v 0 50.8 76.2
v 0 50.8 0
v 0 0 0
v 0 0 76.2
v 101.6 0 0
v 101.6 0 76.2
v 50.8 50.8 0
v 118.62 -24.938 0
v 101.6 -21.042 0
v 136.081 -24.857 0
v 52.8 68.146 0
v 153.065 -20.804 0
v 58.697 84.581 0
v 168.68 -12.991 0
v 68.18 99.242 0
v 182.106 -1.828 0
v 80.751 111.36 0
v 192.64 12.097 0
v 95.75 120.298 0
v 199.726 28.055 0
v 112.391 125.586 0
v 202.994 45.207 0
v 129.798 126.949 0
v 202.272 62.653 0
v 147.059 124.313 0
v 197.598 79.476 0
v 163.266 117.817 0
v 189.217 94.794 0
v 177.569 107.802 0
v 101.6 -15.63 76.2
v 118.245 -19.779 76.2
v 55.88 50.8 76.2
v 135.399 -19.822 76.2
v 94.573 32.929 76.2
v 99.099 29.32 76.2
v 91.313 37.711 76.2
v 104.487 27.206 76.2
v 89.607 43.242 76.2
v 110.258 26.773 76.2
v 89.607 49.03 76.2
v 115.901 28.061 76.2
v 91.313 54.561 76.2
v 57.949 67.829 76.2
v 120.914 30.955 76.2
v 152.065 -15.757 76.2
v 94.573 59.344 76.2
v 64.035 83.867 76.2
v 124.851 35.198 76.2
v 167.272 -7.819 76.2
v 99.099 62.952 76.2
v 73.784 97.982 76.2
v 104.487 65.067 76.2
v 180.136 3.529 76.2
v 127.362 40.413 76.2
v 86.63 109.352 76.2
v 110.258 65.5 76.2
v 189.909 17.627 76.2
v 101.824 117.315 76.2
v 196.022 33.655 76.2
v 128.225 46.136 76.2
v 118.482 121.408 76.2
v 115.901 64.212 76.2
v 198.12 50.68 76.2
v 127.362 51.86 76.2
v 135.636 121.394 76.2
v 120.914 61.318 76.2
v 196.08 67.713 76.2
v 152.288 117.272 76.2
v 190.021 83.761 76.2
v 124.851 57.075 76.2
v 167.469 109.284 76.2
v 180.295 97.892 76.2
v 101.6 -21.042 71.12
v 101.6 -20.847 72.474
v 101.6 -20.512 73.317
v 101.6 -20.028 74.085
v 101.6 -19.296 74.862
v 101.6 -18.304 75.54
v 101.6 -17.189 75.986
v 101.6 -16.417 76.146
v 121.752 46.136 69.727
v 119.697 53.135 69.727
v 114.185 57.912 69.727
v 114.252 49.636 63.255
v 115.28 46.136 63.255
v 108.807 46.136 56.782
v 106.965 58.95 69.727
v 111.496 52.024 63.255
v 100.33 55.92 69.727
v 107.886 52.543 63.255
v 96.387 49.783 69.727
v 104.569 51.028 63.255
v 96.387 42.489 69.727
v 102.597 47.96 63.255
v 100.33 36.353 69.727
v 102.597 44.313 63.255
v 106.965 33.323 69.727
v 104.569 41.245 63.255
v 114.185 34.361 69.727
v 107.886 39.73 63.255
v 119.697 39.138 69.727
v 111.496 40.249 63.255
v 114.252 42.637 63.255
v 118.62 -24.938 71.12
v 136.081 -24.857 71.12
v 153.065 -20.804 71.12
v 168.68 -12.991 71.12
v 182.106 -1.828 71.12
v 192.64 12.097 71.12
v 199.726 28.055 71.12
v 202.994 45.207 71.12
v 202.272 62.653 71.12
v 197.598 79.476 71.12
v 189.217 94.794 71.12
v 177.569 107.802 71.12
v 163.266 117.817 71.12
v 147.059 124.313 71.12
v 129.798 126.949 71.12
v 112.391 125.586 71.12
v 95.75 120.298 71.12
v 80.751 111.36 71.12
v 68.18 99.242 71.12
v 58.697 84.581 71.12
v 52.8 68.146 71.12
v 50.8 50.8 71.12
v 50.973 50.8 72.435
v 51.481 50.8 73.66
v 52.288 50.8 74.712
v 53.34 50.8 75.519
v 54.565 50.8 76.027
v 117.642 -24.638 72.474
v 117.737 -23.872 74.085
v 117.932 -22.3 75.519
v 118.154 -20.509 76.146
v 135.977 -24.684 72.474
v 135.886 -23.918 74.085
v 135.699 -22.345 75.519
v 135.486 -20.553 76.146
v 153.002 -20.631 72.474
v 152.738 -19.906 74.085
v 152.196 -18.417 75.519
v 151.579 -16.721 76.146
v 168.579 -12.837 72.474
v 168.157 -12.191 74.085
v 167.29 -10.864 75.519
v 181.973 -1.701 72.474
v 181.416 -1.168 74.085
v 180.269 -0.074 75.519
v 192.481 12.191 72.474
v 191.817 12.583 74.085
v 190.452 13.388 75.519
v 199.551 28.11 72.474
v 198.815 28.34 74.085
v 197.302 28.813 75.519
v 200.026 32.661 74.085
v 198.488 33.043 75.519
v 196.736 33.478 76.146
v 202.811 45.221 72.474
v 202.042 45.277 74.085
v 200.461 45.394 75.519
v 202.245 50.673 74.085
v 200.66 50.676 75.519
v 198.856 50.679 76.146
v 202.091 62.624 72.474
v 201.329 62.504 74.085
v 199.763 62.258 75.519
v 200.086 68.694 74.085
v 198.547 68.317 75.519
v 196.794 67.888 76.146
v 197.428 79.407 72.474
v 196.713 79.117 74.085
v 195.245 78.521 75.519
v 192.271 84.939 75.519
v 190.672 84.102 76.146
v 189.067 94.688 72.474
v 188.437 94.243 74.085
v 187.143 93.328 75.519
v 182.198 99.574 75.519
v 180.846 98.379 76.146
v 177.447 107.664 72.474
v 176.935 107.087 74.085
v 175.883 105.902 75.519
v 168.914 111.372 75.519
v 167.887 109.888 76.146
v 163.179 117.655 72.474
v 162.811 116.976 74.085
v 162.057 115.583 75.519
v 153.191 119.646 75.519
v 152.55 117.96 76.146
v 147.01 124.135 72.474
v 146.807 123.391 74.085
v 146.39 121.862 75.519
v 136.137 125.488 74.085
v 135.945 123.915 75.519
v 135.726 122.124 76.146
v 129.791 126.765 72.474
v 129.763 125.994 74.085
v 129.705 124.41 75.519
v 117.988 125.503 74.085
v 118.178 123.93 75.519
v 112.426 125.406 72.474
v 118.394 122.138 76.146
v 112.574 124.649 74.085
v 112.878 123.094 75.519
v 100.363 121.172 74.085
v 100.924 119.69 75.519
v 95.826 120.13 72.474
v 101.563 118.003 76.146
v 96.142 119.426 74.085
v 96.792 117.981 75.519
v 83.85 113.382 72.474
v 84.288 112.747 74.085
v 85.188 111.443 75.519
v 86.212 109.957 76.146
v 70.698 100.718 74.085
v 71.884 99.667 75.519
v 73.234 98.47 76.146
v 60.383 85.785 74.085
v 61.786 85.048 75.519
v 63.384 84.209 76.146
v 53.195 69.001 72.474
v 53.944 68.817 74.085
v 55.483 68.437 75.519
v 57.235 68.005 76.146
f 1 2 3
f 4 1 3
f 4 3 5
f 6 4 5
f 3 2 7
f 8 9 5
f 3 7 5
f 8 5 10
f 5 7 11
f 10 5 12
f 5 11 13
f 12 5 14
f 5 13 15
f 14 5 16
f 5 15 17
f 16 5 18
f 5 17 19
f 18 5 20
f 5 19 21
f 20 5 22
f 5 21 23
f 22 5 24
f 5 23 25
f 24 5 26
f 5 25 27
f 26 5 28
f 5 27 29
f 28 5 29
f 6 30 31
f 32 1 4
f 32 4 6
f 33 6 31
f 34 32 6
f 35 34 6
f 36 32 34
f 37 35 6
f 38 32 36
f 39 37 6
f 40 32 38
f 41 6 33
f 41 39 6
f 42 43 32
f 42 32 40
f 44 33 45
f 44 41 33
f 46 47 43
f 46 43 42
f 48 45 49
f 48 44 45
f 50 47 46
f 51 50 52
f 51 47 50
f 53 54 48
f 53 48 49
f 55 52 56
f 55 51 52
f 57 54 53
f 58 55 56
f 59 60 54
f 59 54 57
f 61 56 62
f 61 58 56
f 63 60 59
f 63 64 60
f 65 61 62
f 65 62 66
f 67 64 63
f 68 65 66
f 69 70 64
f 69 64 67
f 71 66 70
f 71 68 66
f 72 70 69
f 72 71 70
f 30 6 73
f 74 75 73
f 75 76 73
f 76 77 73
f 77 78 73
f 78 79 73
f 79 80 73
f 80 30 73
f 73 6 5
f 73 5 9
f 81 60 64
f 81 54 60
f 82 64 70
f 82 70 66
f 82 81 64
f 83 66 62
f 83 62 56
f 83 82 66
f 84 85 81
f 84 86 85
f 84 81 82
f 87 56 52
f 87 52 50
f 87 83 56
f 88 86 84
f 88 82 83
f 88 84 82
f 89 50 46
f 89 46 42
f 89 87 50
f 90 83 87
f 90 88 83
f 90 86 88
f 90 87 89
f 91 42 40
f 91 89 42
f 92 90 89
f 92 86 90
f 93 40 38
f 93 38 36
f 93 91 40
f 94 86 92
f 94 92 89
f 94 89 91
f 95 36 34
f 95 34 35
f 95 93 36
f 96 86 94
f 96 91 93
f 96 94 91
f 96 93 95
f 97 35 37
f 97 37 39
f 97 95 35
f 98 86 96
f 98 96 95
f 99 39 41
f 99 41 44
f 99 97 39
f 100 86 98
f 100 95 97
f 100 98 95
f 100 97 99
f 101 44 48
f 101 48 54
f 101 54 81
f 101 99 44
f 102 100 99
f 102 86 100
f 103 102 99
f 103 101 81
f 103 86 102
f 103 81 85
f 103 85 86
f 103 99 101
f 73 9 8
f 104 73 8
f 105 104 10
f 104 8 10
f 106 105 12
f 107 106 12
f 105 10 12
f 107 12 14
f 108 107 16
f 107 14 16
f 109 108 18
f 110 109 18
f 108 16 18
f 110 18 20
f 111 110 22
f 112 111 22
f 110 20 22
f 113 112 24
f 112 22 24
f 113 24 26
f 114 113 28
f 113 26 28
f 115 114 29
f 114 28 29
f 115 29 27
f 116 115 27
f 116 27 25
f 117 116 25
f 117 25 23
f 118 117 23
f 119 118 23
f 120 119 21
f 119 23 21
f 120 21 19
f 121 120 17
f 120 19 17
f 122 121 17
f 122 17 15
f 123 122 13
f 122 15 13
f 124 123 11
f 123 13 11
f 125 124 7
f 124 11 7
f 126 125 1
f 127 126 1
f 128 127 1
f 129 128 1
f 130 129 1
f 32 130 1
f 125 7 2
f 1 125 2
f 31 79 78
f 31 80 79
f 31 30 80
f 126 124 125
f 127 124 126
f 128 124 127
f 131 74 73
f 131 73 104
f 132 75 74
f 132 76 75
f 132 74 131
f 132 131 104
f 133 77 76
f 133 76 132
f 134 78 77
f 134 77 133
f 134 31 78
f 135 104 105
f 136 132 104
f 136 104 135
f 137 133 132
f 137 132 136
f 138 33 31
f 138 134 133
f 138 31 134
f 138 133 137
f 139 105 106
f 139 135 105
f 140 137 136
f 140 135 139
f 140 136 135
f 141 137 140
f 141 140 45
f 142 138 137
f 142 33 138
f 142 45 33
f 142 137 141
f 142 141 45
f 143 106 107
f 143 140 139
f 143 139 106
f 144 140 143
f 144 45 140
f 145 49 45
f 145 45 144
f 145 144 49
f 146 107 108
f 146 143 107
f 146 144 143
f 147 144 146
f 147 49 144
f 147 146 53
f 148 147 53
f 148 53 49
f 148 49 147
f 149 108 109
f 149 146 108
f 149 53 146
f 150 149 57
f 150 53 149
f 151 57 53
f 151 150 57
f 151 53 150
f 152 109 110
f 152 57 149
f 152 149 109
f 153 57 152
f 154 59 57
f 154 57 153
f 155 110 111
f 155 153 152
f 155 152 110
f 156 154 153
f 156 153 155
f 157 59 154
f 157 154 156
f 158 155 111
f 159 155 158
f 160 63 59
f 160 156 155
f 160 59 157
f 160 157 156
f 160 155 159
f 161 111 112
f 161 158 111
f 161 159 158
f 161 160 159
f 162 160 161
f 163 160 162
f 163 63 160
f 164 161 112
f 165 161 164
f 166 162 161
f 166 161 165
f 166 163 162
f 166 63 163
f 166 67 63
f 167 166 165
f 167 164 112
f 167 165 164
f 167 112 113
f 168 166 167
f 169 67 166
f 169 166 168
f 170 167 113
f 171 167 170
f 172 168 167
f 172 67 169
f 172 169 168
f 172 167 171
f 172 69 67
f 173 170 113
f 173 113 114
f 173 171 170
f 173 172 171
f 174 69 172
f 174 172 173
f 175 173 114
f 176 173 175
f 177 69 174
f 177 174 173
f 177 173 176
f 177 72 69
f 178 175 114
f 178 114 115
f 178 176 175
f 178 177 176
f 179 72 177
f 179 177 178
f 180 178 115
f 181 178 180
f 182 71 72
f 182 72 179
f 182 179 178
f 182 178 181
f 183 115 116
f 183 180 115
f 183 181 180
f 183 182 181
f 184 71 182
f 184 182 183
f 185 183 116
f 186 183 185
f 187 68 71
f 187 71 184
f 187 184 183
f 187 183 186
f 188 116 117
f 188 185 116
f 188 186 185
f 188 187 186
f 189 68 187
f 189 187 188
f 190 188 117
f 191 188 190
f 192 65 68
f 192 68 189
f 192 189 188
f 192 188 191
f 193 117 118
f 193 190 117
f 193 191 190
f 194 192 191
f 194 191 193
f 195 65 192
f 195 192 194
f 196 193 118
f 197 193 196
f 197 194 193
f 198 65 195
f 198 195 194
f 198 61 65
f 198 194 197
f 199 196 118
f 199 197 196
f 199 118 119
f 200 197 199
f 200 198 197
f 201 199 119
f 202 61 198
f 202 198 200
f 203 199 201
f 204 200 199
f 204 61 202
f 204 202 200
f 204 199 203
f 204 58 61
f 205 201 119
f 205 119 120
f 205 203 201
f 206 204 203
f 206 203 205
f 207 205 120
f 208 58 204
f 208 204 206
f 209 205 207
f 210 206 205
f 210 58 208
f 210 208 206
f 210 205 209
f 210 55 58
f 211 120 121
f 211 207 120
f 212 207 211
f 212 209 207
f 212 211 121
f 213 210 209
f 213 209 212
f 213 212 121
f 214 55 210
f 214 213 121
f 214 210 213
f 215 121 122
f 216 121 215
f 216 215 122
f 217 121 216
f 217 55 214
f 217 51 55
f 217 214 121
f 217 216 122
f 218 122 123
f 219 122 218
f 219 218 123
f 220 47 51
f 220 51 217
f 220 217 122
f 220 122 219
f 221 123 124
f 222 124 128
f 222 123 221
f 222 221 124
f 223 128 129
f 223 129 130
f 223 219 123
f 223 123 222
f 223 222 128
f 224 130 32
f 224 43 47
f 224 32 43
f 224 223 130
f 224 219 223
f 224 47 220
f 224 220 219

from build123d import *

# Parameters (mm, degrees)
F1_DEPTH = 76.2
F2_R     = 5.08
F3_R     = 19.4175013285


# Not quite as in the source:
# - an extrude whose draft closes it to a point is written as a loft to that point


with BuildPart() as f1:
    # F0 (on Top) → F1 (new body)
    with BuildSketch(Plane.XY):
        with BuildLine():
            Line((0, 50.8), (0, 0))
            Line((0, 0), (101.6, 0))
            Line((101.6, 0), (101.6, -21.0420489686))
            ThreePointArc((101.6, -21.0420489686), (189.2170394667, 94.7940905122), (50.8, 50.8))
            Line((50.8, 50.8), (0, 50.8))
        make_face()
    extrude(amount=F1_DEPTH)

    # F2
    f2_edges = [f1.edges().sort_by_distance(p)[0] for p in [
        (189.217039, 94.794091, 76.2),
    ]]
    fillet(f2_edges, radius=F2_R)

    # F3 (on face) → F4 section 0
    with BuildSketch(Plane.XY.offset(76.2), mode=Mode.PRIVATE) as f4_s0:
        with Locations((108.8073253632, 46.1364276707)):
            Circle(F3_R)
    loft([f4_s0.sketch, Vertex(108.8073253632, 46.1364276707, 56.7824986715)], ruled=True, mode=Mode.SUBTRACT)


solid = f1.part
